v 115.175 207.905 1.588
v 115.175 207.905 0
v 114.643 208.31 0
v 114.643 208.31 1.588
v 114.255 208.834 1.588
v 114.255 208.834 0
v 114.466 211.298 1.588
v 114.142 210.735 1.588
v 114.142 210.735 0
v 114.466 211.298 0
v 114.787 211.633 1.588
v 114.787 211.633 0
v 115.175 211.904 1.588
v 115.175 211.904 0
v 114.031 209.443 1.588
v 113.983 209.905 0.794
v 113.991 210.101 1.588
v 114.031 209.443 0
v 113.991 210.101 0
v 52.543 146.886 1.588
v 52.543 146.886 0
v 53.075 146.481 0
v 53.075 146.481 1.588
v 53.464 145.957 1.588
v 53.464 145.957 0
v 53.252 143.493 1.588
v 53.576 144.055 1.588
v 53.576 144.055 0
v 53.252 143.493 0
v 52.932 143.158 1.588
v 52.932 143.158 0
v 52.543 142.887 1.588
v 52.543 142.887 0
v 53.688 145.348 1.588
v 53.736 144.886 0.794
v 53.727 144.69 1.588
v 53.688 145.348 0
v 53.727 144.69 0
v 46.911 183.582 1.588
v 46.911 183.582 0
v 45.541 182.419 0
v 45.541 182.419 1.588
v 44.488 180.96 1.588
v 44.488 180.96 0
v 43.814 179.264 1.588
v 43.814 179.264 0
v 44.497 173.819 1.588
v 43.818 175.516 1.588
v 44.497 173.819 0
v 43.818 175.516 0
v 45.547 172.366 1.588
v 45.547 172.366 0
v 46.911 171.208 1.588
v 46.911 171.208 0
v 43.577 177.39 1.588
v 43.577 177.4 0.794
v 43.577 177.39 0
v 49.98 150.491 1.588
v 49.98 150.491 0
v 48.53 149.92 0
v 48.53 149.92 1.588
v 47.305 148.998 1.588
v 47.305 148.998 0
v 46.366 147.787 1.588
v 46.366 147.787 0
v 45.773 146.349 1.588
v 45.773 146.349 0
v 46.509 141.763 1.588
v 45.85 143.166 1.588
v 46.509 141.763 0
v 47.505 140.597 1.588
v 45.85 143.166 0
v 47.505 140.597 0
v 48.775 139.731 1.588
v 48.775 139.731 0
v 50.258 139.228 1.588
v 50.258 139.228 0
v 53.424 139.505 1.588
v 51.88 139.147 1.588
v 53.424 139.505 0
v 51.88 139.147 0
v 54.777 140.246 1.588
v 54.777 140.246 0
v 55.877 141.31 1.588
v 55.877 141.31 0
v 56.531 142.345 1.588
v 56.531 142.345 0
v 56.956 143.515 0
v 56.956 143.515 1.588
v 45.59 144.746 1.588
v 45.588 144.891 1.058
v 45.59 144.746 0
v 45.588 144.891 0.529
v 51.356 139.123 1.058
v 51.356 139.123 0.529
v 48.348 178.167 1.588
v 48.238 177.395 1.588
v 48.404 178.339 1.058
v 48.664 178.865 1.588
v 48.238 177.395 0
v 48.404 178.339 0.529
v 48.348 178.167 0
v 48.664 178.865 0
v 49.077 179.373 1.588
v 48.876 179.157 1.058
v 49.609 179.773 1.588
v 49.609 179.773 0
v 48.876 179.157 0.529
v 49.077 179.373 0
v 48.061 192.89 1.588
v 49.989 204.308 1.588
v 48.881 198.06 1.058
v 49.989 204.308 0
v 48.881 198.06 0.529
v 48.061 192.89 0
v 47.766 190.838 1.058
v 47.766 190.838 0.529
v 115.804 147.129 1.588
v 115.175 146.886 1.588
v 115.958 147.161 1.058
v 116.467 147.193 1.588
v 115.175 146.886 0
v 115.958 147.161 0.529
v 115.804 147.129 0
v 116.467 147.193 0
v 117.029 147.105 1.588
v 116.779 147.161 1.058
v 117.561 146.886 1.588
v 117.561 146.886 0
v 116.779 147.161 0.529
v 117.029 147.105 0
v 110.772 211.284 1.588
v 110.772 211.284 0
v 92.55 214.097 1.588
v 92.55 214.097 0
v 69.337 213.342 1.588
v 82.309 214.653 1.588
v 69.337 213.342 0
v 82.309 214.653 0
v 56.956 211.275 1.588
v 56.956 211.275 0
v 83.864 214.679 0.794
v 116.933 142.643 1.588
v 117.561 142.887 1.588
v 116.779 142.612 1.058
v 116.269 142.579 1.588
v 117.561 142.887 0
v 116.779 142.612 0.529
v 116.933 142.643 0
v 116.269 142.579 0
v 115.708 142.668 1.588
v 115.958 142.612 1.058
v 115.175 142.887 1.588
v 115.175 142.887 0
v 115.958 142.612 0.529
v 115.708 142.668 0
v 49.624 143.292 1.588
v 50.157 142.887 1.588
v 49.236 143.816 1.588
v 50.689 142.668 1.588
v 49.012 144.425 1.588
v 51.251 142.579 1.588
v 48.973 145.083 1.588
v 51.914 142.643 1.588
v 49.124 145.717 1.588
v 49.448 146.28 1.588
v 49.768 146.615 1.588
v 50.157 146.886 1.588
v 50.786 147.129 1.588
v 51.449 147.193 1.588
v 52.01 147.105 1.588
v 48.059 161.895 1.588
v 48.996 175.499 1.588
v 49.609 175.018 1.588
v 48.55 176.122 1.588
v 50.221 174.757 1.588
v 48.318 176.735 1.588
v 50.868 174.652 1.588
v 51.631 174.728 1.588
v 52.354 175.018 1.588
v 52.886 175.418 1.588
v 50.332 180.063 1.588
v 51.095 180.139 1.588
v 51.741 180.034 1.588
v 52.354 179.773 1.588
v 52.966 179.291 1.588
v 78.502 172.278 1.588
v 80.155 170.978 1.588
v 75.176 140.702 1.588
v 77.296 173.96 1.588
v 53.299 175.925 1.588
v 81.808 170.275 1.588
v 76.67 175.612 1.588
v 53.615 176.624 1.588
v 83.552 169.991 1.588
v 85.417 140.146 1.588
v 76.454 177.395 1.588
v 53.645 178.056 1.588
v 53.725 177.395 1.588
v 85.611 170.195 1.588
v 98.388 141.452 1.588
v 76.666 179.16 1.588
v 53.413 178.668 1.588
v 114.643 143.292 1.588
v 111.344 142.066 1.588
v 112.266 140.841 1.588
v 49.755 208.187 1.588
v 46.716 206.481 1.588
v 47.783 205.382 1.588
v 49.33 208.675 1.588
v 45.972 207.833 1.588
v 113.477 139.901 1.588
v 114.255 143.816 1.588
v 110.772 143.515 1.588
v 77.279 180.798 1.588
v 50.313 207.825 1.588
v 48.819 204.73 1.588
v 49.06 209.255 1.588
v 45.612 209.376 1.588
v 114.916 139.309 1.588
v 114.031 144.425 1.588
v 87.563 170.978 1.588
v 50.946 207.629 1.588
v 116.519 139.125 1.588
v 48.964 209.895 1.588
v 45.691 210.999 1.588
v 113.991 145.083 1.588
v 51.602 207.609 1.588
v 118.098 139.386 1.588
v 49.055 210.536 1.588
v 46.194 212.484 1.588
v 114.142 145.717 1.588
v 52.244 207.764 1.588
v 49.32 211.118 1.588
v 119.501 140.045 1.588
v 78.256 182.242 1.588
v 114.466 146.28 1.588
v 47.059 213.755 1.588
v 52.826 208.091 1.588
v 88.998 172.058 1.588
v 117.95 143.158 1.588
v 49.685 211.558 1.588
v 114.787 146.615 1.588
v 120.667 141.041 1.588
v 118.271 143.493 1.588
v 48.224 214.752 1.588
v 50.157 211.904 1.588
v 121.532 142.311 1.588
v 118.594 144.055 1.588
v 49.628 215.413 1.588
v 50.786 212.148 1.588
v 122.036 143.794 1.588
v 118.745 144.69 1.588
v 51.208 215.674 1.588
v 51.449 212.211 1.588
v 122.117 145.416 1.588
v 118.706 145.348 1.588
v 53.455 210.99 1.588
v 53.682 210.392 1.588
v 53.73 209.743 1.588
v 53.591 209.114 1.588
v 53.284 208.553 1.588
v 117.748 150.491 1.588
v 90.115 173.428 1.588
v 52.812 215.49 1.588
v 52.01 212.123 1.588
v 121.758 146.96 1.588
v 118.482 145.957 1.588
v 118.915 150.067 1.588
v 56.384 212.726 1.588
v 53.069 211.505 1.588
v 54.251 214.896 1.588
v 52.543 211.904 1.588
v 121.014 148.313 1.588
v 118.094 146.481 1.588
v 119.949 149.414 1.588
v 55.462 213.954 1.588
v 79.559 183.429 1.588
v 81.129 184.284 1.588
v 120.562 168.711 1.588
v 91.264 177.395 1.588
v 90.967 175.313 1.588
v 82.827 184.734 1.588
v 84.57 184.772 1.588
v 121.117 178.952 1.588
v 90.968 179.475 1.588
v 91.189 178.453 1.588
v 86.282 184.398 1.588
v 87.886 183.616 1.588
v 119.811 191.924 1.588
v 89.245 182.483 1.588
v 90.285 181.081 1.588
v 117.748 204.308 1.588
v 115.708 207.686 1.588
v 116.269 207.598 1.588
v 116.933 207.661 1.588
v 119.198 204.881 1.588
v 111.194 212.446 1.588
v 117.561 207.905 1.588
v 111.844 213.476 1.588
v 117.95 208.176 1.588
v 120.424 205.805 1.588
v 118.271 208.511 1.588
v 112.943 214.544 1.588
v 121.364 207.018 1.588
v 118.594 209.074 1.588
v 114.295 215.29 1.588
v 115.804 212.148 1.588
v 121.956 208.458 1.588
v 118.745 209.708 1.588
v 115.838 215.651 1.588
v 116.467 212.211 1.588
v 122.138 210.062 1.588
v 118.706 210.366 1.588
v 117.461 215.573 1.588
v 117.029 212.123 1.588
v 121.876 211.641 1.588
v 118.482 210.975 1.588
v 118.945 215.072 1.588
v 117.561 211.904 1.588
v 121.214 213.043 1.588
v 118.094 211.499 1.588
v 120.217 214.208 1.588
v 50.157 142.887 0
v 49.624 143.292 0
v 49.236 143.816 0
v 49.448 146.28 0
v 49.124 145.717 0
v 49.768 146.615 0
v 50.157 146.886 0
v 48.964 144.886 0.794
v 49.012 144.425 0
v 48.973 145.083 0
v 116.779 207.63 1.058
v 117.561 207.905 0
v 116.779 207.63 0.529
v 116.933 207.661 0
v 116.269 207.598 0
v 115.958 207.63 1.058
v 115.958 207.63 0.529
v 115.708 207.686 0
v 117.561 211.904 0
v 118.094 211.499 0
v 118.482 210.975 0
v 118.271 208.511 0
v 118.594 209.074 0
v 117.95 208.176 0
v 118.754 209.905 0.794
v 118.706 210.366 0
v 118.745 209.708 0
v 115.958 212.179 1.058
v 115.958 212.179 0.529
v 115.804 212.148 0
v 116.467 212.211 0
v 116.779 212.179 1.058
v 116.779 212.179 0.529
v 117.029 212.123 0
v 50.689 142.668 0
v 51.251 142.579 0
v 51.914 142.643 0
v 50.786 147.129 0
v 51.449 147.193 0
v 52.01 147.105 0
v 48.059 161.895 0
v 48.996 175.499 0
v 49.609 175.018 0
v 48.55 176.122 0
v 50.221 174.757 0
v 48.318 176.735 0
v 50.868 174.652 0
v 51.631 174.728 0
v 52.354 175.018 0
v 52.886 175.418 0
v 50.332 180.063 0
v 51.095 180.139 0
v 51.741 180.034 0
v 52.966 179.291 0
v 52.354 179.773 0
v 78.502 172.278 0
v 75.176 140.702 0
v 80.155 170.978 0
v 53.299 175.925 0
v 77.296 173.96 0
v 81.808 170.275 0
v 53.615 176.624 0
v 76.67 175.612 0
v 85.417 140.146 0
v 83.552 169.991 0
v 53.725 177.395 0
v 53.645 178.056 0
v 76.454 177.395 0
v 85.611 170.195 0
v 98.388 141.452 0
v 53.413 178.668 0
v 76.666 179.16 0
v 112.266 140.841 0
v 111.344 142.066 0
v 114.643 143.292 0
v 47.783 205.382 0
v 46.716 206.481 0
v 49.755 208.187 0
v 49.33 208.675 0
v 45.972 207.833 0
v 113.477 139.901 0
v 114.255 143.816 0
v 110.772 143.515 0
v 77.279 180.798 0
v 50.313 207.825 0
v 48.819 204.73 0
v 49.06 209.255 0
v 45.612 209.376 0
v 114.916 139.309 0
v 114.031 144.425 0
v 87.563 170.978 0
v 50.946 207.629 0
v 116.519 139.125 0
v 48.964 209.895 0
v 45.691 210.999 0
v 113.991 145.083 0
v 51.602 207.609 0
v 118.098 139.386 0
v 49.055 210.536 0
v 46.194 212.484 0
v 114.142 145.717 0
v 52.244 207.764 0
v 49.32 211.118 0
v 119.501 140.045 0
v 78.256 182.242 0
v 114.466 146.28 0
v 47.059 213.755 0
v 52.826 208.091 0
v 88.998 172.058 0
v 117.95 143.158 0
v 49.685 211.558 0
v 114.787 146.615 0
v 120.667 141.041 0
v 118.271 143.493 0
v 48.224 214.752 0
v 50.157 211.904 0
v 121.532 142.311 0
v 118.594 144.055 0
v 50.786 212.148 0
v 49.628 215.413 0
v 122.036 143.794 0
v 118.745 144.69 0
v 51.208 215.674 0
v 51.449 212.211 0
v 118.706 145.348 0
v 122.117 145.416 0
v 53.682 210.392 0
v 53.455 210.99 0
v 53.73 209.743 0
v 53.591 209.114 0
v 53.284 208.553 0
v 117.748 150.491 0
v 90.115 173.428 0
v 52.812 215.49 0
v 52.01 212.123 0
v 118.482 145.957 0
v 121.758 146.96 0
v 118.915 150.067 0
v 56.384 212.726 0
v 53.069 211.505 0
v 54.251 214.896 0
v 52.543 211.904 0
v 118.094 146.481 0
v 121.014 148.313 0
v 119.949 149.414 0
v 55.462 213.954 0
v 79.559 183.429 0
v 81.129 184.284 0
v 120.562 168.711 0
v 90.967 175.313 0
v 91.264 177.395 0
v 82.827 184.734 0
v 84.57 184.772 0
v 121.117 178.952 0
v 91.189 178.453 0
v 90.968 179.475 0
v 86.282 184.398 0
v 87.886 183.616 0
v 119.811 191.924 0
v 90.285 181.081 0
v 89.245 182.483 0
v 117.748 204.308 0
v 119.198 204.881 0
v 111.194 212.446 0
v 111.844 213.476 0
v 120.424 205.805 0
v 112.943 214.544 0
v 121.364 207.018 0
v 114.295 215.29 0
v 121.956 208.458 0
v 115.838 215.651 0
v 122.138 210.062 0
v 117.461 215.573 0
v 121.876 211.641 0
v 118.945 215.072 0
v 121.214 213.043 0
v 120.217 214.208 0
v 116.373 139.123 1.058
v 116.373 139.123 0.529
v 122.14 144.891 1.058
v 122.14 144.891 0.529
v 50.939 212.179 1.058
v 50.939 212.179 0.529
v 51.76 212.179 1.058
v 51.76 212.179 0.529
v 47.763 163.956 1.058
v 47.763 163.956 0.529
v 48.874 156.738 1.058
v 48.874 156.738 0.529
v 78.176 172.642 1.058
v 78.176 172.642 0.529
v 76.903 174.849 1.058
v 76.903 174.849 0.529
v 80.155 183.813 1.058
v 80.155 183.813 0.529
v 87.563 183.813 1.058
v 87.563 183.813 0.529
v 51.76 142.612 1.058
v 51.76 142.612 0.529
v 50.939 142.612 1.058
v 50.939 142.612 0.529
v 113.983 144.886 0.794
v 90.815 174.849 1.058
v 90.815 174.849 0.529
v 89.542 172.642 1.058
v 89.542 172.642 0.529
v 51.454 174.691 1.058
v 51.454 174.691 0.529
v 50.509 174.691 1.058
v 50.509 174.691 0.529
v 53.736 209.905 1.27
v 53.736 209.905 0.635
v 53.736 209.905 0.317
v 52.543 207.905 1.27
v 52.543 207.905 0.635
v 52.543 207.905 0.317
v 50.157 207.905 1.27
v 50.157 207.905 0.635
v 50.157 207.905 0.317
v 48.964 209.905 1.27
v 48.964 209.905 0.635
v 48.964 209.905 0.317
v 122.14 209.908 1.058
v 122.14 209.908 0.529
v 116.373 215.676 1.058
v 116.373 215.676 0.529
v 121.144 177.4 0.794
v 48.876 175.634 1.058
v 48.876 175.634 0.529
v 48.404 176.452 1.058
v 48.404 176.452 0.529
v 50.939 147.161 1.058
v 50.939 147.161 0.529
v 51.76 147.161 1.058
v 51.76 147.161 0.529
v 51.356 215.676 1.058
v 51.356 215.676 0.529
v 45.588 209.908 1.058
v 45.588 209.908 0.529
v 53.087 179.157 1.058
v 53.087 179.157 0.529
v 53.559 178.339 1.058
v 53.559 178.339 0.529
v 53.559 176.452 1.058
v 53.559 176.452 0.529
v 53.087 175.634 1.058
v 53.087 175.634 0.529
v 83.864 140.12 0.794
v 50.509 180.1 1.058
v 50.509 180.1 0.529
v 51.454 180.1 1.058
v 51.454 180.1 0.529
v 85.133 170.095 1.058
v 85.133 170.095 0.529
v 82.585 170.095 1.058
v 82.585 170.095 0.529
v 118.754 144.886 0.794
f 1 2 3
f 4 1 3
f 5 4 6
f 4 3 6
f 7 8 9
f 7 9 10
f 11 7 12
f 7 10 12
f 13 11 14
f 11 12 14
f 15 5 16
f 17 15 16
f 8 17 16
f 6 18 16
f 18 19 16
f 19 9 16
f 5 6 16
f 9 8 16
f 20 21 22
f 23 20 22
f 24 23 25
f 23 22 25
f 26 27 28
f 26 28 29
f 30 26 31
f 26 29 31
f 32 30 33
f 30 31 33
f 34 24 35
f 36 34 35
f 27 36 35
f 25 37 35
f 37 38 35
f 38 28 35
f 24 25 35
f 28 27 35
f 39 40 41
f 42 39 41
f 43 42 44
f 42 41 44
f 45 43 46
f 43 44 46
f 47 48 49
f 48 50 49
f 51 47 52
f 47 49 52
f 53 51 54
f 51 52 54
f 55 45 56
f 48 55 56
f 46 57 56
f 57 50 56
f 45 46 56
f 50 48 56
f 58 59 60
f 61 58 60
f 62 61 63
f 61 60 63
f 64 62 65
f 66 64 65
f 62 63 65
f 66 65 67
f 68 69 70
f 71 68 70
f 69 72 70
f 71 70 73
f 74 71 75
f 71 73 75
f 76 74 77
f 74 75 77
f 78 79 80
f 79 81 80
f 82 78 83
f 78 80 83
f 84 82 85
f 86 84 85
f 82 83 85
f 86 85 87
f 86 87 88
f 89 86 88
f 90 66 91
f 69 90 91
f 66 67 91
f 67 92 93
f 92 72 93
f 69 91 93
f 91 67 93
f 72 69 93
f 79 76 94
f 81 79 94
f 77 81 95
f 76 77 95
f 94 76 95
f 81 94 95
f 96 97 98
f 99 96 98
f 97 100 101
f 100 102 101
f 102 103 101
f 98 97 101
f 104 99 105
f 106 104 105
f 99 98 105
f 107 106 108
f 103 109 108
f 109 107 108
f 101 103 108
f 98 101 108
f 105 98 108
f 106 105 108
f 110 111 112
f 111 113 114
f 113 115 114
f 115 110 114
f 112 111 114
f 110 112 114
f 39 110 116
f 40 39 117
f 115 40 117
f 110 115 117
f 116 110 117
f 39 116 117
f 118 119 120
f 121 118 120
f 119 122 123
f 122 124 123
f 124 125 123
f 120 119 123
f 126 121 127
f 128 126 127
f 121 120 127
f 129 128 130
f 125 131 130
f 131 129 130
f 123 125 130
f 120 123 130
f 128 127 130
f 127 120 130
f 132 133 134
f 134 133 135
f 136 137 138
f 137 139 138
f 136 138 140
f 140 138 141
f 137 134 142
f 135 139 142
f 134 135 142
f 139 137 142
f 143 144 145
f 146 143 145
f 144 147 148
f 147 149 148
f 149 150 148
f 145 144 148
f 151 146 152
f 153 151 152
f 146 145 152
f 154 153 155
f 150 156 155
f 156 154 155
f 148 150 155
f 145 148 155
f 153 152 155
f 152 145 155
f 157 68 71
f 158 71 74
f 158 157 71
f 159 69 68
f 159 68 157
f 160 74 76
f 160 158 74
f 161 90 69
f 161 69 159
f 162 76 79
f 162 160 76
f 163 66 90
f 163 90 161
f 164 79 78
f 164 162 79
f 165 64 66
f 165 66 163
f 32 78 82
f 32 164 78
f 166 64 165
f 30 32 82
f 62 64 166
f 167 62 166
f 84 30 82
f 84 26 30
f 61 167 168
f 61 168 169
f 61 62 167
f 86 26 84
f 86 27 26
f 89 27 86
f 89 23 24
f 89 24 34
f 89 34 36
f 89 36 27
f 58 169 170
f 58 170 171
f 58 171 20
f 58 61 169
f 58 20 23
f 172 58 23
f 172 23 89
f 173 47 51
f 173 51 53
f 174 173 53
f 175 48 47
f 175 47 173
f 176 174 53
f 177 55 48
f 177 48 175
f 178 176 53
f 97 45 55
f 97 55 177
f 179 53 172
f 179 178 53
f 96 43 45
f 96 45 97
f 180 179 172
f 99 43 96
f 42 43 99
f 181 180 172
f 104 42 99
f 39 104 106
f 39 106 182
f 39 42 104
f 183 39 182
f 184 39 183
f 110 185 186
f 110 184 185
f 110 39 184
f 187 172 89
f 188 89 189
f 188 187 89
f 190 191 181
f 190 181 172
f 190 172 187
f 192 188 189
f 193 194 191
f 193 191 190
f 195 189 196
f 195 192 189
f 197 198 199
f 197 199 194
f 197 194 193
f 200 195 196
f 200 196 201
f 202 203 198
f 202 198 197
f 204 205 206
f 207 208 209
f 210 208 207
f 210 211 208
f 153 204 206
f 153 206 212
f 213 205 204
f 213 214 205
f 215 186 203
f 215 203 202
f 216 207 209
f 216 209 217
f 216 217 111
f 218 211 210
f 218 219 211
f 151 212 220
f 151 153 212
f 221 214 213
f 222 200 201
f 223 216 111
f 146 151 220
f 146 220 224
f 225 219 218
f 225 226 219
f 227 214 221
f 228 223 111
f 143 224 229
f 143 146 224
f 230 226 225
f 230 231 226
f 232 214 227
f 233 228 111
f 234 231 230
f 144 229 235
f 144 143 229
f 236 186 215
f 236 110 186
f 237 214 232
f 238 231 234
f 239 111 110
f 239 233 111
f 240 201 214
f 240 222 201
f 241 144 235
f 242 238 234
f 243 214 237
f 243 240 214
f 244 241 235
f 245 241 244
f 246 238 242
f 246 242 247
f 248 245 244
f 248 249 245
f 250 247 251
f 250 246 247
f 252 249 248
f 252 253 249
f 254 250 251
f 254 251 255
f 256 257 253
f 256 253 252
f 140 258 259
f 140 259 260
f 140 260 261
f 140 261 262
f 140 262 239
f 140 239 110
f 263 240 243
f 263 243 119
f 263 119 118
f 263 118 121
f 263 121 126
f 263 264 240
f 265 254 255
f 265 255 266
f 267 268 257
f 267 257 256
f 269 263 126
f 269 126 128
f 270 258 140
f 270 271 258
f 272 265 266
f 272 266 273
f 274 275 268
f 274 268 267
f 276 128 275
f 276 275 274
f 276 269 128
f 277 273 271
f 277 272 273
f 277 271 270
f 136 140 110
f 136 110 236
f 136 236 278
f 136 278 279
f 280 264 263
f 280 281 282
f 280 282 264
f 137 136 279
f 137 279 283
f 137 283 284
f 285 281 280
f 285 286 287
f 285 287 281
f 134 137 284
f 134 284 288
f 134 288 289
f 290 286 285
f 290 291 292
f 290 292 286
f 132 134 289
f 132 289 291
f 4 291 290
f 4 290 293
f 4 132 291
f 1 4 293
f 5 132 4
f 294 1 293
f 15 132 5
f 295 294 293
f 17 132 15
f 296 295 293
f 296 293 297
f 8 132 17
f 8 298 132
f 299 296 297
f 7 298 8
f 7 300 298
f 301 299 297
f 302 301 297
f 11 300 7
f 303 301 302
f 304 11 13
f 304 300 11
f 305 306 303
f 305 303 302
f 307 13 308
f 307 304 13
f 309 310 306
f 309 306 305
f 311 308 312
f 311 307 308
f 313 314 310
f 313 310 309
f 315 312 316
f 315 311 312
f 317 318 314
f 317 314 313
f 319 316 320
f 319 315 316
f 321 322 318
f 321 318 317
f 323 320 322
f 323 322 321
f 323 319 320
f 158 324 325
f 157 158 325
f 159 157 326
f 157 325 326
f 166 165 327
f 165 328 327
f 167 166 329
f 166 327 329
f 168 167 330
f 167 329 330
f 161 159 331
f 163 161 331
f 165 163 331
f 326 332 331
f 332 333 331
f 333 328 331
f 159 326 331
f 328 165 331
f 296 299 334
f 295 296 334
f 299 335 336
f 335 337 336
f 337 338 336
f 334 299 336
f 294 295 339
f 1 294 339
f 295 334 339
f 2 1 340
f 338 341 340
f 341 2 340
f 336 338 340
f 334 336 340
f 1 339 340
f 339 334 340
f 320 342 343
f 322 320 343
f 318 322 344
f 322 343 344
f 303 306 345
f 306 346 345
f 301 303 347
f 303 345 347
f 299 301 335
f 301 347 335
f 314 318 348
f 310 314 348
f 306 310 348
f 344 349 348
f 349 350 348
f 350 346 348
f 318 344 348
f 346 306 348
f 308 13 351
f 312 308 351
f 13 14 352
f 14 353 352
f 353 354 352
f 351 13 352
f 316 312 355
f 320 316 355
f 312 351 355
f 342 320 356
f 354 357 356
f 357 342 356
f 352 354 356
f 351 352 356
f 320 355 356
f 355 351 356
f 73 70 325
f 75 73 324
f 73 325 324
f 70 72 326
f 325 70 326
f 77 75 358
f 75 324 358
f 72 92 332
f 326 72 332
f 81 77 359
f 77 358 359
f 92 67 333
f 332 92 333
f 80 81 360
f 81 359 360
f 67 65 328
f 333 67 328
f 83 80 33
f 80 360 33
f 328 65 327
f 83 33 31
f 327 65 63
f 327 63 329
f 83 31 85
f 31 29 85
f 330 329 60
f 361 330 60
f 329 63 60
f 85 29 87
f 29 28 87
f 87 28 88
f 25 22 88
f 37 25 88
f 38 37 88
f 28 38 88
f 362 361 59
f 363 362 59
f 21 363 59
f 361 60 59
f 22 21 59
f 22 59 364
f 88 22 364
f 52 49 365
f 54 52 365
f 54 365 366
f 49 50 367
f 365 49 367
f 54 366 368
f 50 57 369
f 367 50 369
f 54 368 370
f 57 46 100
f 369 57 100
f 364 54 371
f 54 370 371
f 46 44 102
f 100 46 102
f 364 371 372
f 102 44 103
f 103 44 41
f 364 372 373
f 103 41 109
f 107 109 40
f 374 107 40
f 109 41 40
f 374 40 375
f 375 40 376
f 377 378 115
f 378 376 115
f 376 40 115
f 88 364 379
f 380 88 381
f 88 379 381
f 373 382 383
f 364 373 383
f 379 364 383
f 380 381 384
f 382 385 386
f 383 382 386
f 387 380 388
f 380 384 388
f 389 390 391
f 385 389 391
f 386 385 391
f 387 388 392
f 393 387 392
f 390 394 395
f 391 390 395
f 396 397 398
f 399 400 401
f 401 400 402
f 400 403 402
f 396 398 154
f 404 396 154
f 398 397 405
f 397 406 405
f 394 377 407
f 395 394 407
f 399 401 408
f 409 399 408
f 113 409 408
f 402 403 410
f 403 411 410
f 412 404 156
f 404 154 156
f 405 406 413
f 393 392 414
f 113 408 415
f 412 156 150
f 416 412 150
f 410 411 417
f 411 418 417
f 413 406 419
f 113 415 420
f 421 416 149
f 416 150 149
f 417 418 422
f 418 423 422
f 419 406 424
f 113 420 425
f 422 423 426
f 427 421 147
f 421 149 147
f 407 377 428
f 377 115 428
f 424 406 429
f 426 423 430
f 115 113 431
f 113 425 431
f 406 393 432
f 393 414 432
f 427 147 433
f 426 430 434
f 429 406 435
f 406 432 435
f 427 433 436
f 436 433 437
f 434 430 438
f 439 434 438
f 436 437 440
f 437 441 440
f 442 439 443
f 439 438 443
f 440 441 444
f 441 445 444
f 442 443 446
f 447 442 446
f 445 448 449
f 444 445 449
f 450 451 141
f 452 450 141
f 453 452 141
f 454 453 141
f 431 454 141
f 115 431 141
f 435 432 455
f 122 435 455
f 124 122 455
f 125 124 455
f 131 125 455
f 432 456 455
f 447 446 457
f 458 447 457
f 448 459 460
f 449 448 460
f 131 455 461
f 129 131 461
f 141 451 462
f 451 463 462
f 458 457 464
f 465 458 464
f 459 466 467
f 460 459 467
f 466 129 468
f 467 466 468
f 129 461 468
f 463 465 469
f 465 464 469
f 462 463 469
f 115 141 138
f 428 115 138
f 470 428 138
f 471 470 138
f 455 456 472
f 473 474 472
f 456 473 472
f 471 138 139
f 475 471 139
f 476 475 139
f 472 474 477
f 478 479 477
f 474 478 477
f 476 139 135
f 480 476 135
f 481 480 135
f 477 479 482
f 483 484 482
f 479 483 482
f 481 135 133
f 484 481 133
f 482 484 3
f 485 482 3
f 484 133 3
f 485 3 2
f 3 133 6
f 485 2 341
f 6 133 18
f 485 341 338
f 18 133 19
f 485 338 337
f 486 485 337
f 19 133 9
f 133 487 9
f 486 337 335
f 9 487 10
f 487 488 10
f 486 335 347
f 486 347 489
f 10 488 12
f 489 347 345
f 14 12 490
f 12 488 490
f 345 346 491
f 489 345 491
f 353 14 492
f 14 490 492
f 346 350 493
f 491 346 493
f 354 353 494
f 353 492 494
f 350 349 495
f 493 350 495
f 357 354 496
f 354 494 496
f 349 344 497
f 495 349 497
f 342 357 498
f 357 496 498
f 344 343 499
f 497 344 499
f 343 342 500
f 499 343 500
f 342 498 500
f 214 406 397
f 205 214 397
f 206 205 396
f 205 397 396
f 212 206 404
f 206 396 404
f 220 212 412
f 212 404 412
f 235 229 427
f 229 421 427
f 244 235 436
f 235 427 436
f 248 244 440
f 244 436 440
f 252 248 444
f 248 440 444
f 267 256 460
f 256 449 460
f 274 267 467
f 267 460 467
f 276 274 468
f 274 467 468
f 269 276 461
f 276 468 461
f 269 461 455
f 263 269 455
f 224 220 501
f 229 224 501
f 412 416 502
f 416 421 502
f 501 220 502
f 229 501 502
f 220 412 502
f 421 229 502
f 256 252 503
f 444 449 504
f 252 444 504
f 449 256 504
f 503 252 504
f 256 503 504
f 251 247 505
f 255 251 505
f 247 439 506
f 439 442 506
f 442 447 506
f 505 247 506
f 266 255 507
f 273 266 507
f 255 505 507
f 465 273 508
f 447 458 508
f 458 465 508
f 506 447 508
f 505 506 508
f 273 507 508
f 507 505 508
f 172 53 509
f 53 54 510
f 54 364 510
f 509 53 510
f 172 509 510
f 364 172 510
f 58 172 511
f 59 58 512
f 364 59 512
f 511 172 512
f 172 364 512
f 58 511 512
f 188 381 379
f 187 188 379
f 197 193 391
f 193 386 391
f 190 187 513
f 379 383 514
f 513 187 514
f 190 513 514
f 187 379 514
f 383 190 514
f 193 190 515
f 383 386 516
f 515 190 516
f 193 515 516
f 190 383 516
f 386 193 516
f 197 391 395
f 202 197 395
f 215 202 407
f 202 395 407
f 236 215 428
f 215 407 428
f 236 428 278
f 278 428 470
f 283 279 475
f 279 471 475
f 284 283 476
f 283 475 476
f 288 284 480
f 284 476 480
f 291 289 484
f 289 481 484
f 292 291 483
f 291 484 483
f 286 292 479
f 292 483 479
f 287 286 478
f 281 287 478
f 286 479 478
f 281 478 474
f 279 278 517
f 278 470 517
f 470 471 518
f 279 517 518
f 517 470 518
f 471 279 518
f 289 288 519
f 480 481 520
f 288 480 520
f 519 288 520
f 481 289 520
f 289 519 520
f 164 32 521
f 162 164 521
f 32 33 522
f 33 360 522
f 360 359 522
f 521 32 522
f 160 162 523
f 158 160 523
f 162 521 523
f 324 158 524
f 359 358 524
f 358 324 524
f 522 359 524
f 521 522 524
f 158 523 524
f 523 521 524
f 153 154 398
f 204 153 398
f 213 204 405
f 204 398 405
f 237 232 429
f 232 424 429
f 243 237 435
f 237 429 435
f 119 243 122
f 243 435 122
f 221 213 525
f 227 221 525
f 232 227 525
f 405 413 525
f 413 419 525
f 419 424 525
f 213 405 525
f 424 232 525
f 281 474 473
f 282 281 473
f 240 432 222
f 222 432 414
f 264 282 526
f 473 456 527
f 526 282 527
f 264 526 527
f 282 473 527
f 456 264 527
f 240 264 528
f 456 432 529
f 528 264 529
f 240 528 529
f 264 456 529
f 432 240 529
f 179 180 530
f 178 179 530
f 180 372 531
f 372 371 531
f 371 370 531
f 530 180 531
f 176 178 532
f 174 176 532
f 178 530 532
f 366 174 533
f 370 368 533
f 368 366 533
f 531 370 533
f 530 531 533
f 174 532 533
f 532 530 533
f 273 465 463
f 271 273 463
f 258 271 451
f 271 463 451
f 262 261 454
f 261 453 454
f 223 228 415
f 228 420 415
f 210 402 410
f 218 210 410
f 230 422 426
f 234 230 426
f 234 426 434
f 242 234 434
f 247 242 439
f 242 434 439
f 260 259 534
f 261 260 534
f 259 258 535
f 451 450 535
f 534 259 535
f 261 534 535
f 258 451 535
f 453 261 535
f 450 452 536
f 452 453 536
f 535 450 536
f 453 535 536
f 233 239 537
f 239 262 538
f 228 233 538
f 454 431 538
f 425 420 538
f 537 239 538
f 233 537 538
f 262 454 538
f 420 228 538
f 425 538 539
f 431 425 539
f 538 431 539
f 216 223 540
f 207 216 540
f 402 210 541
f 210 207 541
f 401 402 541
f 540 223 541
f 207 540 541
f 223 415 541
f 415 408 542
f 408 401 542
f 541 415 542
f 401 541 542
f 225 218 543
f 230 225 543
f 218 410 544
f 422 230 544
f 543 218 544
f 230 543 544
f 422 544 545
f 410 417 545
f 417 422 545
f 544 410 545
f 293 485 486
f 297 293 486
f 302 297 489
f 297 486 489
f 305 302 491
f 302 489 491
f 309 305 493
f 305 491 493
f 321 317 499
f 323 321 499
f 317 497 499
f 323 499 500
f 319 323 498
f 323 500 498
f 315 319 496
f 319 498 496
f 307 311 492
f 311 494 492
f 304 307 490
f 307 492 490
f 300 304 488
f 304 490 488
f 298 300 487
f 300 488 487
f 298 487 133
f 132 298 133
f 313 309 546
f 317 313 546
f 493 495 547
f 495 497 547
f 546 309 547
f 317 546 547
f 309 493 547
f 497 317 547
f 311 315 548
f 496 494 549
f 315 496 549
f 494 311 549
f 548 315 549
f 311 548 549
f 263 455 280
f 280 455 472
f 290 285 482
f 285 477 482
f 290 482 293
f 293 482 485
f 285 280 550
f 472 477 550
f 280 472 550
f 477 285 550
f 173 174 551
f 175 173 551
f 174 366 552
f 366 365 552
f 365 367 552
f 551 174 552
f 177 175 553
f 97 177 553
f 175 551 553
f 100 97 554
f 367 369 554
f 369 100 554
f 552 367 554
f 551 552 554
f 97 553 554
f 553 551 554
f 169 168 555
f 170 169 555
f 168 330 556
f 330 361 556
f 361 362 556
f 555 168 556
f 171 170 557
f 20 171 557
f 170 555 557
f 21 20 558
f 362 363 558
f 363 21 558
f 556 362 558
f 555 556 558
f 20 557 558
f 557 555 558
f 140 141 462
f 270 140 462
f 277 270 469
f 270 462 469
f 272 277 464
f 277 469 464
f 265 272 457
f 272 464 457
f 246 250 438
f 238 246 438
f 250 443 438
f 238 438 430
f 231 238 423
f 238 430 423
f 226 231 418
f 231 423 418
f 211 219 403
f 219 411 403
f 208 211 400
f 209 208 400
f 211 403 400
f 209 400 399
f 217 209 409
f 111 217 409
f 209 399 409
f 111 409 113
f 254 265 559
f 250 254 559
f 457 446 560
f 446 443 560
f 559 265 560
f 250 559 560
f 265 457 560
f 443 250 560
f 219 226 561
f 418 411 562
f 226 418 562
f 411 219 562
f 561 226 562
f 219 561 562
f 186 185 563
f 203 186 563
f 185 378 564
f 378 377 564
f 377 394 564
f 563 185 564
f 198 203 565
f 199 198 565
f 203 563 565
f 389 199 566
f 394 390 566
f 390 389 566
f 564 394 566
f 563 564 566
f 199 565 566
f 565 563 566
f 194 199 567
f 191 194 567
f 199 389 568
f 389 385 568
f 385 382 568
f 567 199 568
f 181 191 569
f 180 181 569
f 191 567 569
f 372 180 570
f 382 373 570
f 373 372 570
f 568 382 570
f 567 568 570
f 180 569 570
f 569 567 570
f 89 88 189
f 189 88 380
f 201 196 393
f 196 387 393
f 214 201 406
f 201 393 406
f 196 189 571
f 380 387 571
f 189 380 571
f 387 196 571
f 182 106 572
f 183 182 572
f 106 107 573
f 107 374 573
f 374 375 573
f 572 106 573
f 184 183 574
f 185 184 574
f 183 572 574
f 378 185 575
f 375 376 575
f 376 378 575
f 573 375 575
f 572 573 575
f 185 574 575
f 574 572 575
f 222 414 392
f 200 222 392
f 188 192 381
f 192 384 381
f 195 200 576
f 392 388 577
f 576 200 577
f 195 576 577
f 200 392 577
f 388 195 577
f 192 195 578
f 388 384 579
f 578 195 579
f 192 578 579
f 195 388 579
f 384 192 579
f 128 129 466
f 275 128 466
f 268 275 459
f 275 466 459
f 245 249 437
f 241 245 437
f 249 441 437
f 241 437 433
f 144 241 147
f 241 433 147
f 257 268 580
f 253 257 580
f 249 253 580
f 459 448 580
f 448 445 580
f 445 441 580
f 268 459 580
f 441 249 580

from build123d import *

# Parameters (mm, degrees)
BOSS_EXTRUDE1_DEPTH = 1.5875


with BuildPart() as part:
    # Model → Boss-Extrude1 (new body)
    with BuildSketch(Plane.XY):
        with BuildLine():
            add(Edge.make_bspline(
                [(51.355625, 215.675903), (48.170397, 215.675903), (45.587708, 213.093214), (45.587708, 209.907986)],
                knots=[0, 0, 0, 0, 1, 1, 1, 1], degree=3))
            add(Edge.make_bspline(
                [(45.587708, 209.907986), (45.587708, 207.192636), (47.461661, 204.920366), (49.988611, 204.307639)],
                knots=[0, 0, 0, 0, 1, 1, 1, 1], degree=3))
            add(Edge.make_bspline(
                [(49.988611, 204.307639), (48.973952, 198.860581), (47.546613, 190.540568), (46.910625, 183.581944)],
                knots=[0, 0, 0, 0, 1, 1, 1, 1], degree=3))
            add(Edge.make_bspline(
                [(46.910625, 183.581944), (44.902013, 182.25747), (43.576875, 179.985474), (43.576875, 177.399514)],
                knots=[0, 0, 0, 0, 1, 1, 1, 1], degree=3))
            add(Edge.make_bspline(
                [(43.576875, 177.399514), (43.576875, 174.813554), (44.902013, 172.532738), (46.910625, 171.208264)],
                knots=[0, 0, 0, 0, 1, 1, 1, 1], degree=3))
            add(Edge.make_bspline(
                [(46.910625, 171.208264), (47.544341, 164.25069), (48.96575, 155.940084), (49.979792, 150.491389)],
                knots=[0, 0, 0, 0, 1, 1, 1, 1], degree=3))
            add(Edge.make_bspline(
                [(49.979792, 150.491389), (47.456739, 149.875899), (45.587708, 147.603626), (45.587708, 144.891042)],
                knots=[0, 0, 0, 0, 1, 1, 1, 1], degree=3))
            add(Edge.make_bspline(
                [(45.587708, 144.891042), (45.587708, 141.705814), (48.170397, 139.123125), (51.355625, 139.123125)],
                knots=[0, 0, 0, 0, 1, 1, 1, 1], degree=3))
            add(Edge.make_bspline(
                [(51.355625, 139.123125), (54.06821, 139.123125), (56.340482, 140.992156), (56.955972, 143.515208)],
                knots=[0, 0, 0, 0, 1, 1, 1, 1], degree=3))
            add(Edge.make_bspline(
                [(56.955972, 143.515208), (64.168065, 142.172988), (76.405904, 140.119722), (83.864097, 140.119722)],
                knots=[0, 0, 0, 0, 1, 1, 1, 1], degree=3))
            add(Edge.make_bspline(
                [(83.864097, 140.119722), (91.322294, 140.119722), (103.560129, 142.172988), (110.772222, 143.515208)],
                knots=[0, 0, 0, 0, 1, 1, 1, 1], degree=3))
            add(Edge.make_bspline(
                [(110.772222, 143.515208), (111.387873, 140.992384), (113.660149, 139.123125), (116.372569, 139.123125)],
                knots=[0, 0, 0, 0, 1, 1, 1, 1], degree=3))
            add(Edge.make_bspline(
                [(116.372569, 139.123125), (119.557797, 139.123125), (122.140486, 141.705814), (122.140486, 144.891042)],
                knots=[0, 0, 0, 0, 1, 1, 1, 1], degree=3))
            add(Edge.make_bspline(
                [(122.140486, 144.891042), (122.140486, 147.601343), (120.268238, 149.87363), (117.748403, 150.491389)],
                knots=[0, 0, 0, 0, 1, 1, 1, 1], degree=3))
            add(Edge.make_bspline(
                [(117.748403, 150.491389), (119.090623, 157.703482), (121.143889, 169.941318), (121.143889, 177.399514)],
                knots=[0, 0, 0, 0, 1, 1, 1, 1], degree=3))
            add(Edge.make_bspline(
                [(121.143889, 177.399514), (121.143889, 184.85771), (119.090623, 197.095546), (117.748403, 204.307639)],
                knots=[0, 0, 0, 0, 1, 1, 1, 1], degree=3))
            add(Edge.make_bspline(
                [(117.748403, 204.307639), (120.268043, 204.925536), (122.140486, 207.197823), (122.140486, 209.907986)],
                knots=[0, 0, 0, 0, 1, 1, 1, 1], degree=3))
            add(Edge.make_bspline(
                [(122.140486, 209.907986), (122.140486, 213.093214), (119.557797, 215.675903), (116.372569, 215.675903)],
                knots=[0, 0, 0, 0, 1, 1, 1, 1], degree=3))
            add(Edge.make_bspline(
                [(116.372569, 215.675903), (113.662406, 215.675903), (111.39012, 213.80346), (110.772222, 211.283819)],
                knots=[0, 0, 0, 0, 1, 1, 1, 1], degree=3))
            add(Edge.make_bspline(
                [(110.772222, 211.283819), (103.560129, 212.62604), (91.322294, 214.679306), (83.864097, 214.679306)],
                knots=[0, 0, 0, 0, 1, 1, 1, 1], degree=3))
            add(Edge.make_bspline(
                [(83.864097, 214.679306), (76.404414, 214.679306), (64.16677, 212.618076), (56.955972, 211.275)],
                knots=[0, 0, 0, 0, 1, 1, 1, 1], degree=3))
            add(Edge.make_bspline(
                [(56.955972, 211.275), (56.341256, 213.799142), (54.068983, 215.675903), (51.355625, 215.675903)],
                knots=[0, 0, 0, 0, 1, 1, 1, 1], degree=3))
        make_face()
        with BuildLine():
            add(Edge.make_bspline(
                [(53.73559, 209.904656), (53.73559, 209.079821), (53.28086, 208.317642), (52.542694, 207.905225)],
                knots=[0, 0, 0, 0, 1, 1, 1, 1], degree=3))
            add(Edge.make_bspline(
                [(52.542694, 207.905225), (51.804528, 207.492808), (50.895069, 207.492808), (50.156903, 207.905225)],
                knots=[0, 0, 0, 0, 1, 1, 1, 1], degree=3))
            add(Edge.make_bspline(
                [(50.156903, 207.905225), (49.418737, 208.317642), (48.964008, 209.079821), (48.964008, 209.904656)],
                knots=[0, 0, 0, 0, 1, 1, 1, 1], degree=3))
            add(Edge.make_bspline(
                [(48.964008, 209.904656), (48.964008, 210.729491), (49.418737, 211.49167), (50.156903, 211.904087)],
                knots=[0, 0, 0, 0, 1, 1, 1, 1], degree=3))
            add(Edge.make_bspline(
                [(50.156903, 211.904087), (50.895069, 212.316505), (51.804528, 212.316505), (52.542694, 211.904087)],
                knots=[0, 0, 0, 0, 1, 1, 1, 1], degree=3))
            add(Edge.make_bspline(
                [(52.542694, 211.904087), (53.28086, 211.49167), (53.73559, 210.729491), (53.73559, 209.904656)],
                knots=[0, 0, 0, 0, 1, 1, 1, 1], degree=3))
        make_face(mode=Mode.SUBTRACT)
        with BuildLine():
            add(Edge.make_bspline(
                [(118.754103, 144.88614), (118.754103, 144.061305), (118.299374, 143.299126), (117.561208, 142.886709)],
                knots=[0, 0, 0, 0, 1, 1, 1, 1], degree=3))
            add(Edge.make_bspline(
                [(117.561208, 142.886709), (116.823041, 142.474291), (115.913583, 142.474291), (115.175417, 142.886709)],
                knots=[0, 0, 0, 0, 1, 1, 1, 1], degree=3))
            add(Edge.make_bspline(
                [(115.175417, 142.886709), (114.437251, 143.299126), (113.982521, 144.061305), (113.982521, 144.88614)],
                knots=[0, 0, 0, 0, 1, 1, 1, 1], degree=3))
            add(Edge.make_bspline(
                [(113.982521, 144.88614), (113.982521, 145.710975), (114.437251, 146.473153), (115.175417, 146.885571)],
                knots=[0, 0, 0, 0, 1, 1, 1, 1], degree=3))
            add(Edge.make_bspline(
                [(115.175417, 146.885571), (115.913583, 147.297988), (116.823041, 147.297988), (117.561208, 146.885571)],
                knots=[0, 0, 0, 0, 1, 1, 1, 1], degree=3))
            add(Edge.make_bspline(
                [(117.561208, 146.885571), (118.299374, 146.473153), (118.754103, 145.710975), (118.754103, 144.88614)],
                knots=[0, 0, 0, 0, 1, 1, 1, 1], degree=3))
        make_face(mode=Mode.SUBTRACT)
        with BuildLine():
            add(Edge.make_bspline(
                [(53.73559, 144.88614), (53.73559, 144.061305), (53.28086, 143.299126), (52.542694, 142.886709)],
                knots=[0, 0, 0, 0, 1, 1, 1, 1], degree=3))
            add(Edge.make_bspline(
                [(52.542694, 142.886709), (51.804528, 142.474291), (50.895069, 142.474291), (50.156903, 142.886709)],
                knots=[0, 0, 0, 0, 1, 1, 1, 1], degree=3))
            add(Edge.make_bspline(
                [(50.156903, 142.886709), (49.418737, 143.299126), (48.964008, 144.061305), (48.964008, 144.88614)],
                knots=[0, 0, 0, 0, 1, 1, 1, 1], degree=3))
            add(Edge.make_bspline(
                [(48.964008, 144.88614), (48.964008, 145.710975), (49.418737, 146.473153), (50.156903, 146.885571)],
                knots=[0, 0, 0, 0, 1, 1, 1, 1], degree=3))
            add(Edge.make_bspline(
                [(50.156903, 146.885571), (50.895069, 147.297988), (51.804528, 147.297988), (52.542694, 146.885571)],
                knots=[0, 0, 0, 0, 1, 1, 1, 1], degree=3))
            add(Edge.make_bspline(
                [(52.542694, 146.885571), (53.28086, 146.473153), (53.73559, 145.710975), (53.73559, 144.88614)],
                knots=[0, 0, 0, 0, 1, 1, 1, 1], degree=3))
        make_face(mode=Mode.SUBTRACT)
        with BuildLine():
            add(Edge.make_bspline(
                [(118.754103, 209.904653), (118.754103, 209.079818), (118.299374, 208.31764), (117.561208, 207.905222)],
                knots=[0, 0, 0, 0, 1, 1, 1, 1], degree=3))
            add(Edge.make_bspline(
                [(117.561208, 207.905222), (116.823041, 207.492805), (115.913583, 207.492805), (115.175417, 207.905222)],
                knots=[0, 0, 0, 0, 1, 1, 1, 1], degree=3))
            add(Edge.make_bspline(
                [(115.175417, 207.905222), (114.437251, 208.31764), (113.982521, 209.079818), (113.982521, 209.904653)],
                knots=[0, 0, 0, 0, 1, 1, 1, 1], degree=3))
            add(Edge.make_bspline(
                [(113.982521, 209.904653), (113.982521, 210.729488), (114.437251, 211.491667), (115.175417, 211.904084)],
                knots=[0, 0, 0, 0, 1, 1, 1, 1], degree=3))
            add(Edge.make_bspline(
                [(115.175417, 211.904084), (115.913583, 212.316502), (116.823041, 212.316502), (117.561208, 211.904084)],
                knots=[0, 0, 0, 0, 1, 1, 1, 1], degree=3))
            add(Edge.make_bspline(
                [(117.561208, 211.904084), (118.299374, 211.491667), (118.754103, 210.729488), (118.754103, 209.904653)],
                knots=[0, 0, 0, 0, 1, 1, 1, 1], degree=3))
        make_face(mode=Mode.SUBTRACT)
        with BuildLine():
            add(Edge.make_bspline(
                [(53.725135, 177.395399), (53.725794, 176.41473), (53.202992, 175.508272), (52.353818, 175.017747)],
                knots=[0, 0, 0, 0, 1, 1, 1, 1], degree=3))
            add(Edge.make_bspline(
                [(52.353818, 175.017747), (51.504643, 174.527222), (50.458227, 174.527222), (49.609052, 175.017747)],
                knots=[0, 0, 0, 0, 1, 1, 1, 1], degree=3))
            add(Edge.make_bspline(
                [(49.609052, 175.017747), (48.759878, 175.508272), (48.237076, 176.41473), (48.237735, 177.395399)],
                knots=[0, 0, 0, 0, 1, 1, 1, 1], degree=3))
            add(Edge.make_bspline(
                [(48.237735, 177.395399), (48.237076, 178.376068), (48.759878, 179.282526), (49.609052, 179.773051)],
                knots=[0, 0, 0, 0, 1, 1, 1, 1], degree=3))
            add(Edge.make_bspline(
                [(49.609052, 179.773051), (50.458227, 180.263576), (51.504643, 180.263576), (52.353818, 179.773051)],
                knots=[0, 0, 0, 0, 1, 1, 1, 1], degree=3))
            add(Edge.make_bspline(
                [(52.353818, 179.773051), (53.202992, 179.282526), (53.725794, 178.376068), (53.725135, 177.395399)],
                knots=[0, 0, 0, 0, 1, 1, 1, 1], degree=3))
        make_face(mode=Mode.SUBTRACT)
        with BuildLine():
            add(Edge.make_bspline(
                [(91.264482, 177.395404), (91.266263, 174.748514), (89.855187, 172.301924), (87.563209, 170.977965)],
                knots=[0, 0, 0, 0, 1, 1, 1, 1], degree=3))
            add(Edge.make_bspline(
                [(87.563209, 170.977965), (85.271231, 169.654005), (82.446884, 169.654005), (80.154906, 170.977965)],
                knots=[0, 0, 0, 0, 1, 1, 1, 1], degree=3))
            add(Edge.make_bspline(
                [(80.154906, 170.977965), (77.862928, 172.301924), (76.451852, 174.748514), (76.453632, 177.395404)],
                knots=[0, 0, 0, 0, 1, 1, 1, 1], degree=3))
            add(Edge.make_bspline(
                [(76.453632, 177.395404), (76.451852, 180.042294), (77.862928, 182.488884), (80.154906, 183.812843)],
                knots=[0, 0, 0, 0, 1, 1, 1, 1], degree=3))
            add(Edge.make_bspline(
                [(80.154906, 183.812843), (82.446884, 185.136802), (85.271231, 185.136802), (87.563209, 183.812843)],
                knots=[0, 0, 0, 0, 1, 1, 1, 1], degree=3))
            add(Edge.make_bspline(
                [(87.563209, 183.812843), (89.855187, 182.488884), (91.266263, 180.042294), (91.264482, 177.395404)],
                knots=[0, 0, 0, 0, 1, 1, 1, 1], degree=3))
        make_face(mode=Mode.SUBTRACT)
    extrude(amount=BOSS_EXTRUDE1_DEPTH)


solid = part.part
